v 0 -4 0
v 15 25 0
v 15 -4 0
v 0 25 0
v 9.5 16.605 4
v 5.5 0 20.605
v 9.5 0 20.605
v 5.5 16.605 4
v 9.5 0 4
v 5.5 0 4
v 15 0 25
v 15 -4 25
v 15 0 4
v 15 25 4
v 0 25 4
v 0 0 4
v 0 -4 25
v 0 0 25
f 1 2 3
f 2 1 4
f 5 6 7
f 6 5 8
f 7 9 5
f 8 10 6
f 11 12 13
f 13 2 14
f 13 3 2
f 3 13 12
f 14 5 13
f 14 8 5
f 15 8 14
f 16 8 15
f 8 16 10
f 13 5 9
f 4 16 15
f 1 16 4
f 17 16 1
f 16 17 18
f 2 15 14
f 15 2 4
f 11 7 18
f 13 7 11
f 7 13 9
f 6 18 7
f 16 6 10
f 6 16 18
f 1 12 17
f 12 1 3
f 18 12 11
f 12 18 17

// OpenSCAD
// All dimensions in mm
$fn = 64;
W = 15;
L = 25;
T = 4;
module Brace()
{
    cube([W, L, T]);
    rotate([90, 0, 0]) cube([W, L, T]);
    intersection() {
      translate([0, -0.01, 0]) cube([L, L, L]);
      translate([0.5 * (W - T), -0.75 * L, 0]) translate([0, 0, T]) rotate([-45, 0, 0]) cube([T, L, L]);
    }
}




Brace();
